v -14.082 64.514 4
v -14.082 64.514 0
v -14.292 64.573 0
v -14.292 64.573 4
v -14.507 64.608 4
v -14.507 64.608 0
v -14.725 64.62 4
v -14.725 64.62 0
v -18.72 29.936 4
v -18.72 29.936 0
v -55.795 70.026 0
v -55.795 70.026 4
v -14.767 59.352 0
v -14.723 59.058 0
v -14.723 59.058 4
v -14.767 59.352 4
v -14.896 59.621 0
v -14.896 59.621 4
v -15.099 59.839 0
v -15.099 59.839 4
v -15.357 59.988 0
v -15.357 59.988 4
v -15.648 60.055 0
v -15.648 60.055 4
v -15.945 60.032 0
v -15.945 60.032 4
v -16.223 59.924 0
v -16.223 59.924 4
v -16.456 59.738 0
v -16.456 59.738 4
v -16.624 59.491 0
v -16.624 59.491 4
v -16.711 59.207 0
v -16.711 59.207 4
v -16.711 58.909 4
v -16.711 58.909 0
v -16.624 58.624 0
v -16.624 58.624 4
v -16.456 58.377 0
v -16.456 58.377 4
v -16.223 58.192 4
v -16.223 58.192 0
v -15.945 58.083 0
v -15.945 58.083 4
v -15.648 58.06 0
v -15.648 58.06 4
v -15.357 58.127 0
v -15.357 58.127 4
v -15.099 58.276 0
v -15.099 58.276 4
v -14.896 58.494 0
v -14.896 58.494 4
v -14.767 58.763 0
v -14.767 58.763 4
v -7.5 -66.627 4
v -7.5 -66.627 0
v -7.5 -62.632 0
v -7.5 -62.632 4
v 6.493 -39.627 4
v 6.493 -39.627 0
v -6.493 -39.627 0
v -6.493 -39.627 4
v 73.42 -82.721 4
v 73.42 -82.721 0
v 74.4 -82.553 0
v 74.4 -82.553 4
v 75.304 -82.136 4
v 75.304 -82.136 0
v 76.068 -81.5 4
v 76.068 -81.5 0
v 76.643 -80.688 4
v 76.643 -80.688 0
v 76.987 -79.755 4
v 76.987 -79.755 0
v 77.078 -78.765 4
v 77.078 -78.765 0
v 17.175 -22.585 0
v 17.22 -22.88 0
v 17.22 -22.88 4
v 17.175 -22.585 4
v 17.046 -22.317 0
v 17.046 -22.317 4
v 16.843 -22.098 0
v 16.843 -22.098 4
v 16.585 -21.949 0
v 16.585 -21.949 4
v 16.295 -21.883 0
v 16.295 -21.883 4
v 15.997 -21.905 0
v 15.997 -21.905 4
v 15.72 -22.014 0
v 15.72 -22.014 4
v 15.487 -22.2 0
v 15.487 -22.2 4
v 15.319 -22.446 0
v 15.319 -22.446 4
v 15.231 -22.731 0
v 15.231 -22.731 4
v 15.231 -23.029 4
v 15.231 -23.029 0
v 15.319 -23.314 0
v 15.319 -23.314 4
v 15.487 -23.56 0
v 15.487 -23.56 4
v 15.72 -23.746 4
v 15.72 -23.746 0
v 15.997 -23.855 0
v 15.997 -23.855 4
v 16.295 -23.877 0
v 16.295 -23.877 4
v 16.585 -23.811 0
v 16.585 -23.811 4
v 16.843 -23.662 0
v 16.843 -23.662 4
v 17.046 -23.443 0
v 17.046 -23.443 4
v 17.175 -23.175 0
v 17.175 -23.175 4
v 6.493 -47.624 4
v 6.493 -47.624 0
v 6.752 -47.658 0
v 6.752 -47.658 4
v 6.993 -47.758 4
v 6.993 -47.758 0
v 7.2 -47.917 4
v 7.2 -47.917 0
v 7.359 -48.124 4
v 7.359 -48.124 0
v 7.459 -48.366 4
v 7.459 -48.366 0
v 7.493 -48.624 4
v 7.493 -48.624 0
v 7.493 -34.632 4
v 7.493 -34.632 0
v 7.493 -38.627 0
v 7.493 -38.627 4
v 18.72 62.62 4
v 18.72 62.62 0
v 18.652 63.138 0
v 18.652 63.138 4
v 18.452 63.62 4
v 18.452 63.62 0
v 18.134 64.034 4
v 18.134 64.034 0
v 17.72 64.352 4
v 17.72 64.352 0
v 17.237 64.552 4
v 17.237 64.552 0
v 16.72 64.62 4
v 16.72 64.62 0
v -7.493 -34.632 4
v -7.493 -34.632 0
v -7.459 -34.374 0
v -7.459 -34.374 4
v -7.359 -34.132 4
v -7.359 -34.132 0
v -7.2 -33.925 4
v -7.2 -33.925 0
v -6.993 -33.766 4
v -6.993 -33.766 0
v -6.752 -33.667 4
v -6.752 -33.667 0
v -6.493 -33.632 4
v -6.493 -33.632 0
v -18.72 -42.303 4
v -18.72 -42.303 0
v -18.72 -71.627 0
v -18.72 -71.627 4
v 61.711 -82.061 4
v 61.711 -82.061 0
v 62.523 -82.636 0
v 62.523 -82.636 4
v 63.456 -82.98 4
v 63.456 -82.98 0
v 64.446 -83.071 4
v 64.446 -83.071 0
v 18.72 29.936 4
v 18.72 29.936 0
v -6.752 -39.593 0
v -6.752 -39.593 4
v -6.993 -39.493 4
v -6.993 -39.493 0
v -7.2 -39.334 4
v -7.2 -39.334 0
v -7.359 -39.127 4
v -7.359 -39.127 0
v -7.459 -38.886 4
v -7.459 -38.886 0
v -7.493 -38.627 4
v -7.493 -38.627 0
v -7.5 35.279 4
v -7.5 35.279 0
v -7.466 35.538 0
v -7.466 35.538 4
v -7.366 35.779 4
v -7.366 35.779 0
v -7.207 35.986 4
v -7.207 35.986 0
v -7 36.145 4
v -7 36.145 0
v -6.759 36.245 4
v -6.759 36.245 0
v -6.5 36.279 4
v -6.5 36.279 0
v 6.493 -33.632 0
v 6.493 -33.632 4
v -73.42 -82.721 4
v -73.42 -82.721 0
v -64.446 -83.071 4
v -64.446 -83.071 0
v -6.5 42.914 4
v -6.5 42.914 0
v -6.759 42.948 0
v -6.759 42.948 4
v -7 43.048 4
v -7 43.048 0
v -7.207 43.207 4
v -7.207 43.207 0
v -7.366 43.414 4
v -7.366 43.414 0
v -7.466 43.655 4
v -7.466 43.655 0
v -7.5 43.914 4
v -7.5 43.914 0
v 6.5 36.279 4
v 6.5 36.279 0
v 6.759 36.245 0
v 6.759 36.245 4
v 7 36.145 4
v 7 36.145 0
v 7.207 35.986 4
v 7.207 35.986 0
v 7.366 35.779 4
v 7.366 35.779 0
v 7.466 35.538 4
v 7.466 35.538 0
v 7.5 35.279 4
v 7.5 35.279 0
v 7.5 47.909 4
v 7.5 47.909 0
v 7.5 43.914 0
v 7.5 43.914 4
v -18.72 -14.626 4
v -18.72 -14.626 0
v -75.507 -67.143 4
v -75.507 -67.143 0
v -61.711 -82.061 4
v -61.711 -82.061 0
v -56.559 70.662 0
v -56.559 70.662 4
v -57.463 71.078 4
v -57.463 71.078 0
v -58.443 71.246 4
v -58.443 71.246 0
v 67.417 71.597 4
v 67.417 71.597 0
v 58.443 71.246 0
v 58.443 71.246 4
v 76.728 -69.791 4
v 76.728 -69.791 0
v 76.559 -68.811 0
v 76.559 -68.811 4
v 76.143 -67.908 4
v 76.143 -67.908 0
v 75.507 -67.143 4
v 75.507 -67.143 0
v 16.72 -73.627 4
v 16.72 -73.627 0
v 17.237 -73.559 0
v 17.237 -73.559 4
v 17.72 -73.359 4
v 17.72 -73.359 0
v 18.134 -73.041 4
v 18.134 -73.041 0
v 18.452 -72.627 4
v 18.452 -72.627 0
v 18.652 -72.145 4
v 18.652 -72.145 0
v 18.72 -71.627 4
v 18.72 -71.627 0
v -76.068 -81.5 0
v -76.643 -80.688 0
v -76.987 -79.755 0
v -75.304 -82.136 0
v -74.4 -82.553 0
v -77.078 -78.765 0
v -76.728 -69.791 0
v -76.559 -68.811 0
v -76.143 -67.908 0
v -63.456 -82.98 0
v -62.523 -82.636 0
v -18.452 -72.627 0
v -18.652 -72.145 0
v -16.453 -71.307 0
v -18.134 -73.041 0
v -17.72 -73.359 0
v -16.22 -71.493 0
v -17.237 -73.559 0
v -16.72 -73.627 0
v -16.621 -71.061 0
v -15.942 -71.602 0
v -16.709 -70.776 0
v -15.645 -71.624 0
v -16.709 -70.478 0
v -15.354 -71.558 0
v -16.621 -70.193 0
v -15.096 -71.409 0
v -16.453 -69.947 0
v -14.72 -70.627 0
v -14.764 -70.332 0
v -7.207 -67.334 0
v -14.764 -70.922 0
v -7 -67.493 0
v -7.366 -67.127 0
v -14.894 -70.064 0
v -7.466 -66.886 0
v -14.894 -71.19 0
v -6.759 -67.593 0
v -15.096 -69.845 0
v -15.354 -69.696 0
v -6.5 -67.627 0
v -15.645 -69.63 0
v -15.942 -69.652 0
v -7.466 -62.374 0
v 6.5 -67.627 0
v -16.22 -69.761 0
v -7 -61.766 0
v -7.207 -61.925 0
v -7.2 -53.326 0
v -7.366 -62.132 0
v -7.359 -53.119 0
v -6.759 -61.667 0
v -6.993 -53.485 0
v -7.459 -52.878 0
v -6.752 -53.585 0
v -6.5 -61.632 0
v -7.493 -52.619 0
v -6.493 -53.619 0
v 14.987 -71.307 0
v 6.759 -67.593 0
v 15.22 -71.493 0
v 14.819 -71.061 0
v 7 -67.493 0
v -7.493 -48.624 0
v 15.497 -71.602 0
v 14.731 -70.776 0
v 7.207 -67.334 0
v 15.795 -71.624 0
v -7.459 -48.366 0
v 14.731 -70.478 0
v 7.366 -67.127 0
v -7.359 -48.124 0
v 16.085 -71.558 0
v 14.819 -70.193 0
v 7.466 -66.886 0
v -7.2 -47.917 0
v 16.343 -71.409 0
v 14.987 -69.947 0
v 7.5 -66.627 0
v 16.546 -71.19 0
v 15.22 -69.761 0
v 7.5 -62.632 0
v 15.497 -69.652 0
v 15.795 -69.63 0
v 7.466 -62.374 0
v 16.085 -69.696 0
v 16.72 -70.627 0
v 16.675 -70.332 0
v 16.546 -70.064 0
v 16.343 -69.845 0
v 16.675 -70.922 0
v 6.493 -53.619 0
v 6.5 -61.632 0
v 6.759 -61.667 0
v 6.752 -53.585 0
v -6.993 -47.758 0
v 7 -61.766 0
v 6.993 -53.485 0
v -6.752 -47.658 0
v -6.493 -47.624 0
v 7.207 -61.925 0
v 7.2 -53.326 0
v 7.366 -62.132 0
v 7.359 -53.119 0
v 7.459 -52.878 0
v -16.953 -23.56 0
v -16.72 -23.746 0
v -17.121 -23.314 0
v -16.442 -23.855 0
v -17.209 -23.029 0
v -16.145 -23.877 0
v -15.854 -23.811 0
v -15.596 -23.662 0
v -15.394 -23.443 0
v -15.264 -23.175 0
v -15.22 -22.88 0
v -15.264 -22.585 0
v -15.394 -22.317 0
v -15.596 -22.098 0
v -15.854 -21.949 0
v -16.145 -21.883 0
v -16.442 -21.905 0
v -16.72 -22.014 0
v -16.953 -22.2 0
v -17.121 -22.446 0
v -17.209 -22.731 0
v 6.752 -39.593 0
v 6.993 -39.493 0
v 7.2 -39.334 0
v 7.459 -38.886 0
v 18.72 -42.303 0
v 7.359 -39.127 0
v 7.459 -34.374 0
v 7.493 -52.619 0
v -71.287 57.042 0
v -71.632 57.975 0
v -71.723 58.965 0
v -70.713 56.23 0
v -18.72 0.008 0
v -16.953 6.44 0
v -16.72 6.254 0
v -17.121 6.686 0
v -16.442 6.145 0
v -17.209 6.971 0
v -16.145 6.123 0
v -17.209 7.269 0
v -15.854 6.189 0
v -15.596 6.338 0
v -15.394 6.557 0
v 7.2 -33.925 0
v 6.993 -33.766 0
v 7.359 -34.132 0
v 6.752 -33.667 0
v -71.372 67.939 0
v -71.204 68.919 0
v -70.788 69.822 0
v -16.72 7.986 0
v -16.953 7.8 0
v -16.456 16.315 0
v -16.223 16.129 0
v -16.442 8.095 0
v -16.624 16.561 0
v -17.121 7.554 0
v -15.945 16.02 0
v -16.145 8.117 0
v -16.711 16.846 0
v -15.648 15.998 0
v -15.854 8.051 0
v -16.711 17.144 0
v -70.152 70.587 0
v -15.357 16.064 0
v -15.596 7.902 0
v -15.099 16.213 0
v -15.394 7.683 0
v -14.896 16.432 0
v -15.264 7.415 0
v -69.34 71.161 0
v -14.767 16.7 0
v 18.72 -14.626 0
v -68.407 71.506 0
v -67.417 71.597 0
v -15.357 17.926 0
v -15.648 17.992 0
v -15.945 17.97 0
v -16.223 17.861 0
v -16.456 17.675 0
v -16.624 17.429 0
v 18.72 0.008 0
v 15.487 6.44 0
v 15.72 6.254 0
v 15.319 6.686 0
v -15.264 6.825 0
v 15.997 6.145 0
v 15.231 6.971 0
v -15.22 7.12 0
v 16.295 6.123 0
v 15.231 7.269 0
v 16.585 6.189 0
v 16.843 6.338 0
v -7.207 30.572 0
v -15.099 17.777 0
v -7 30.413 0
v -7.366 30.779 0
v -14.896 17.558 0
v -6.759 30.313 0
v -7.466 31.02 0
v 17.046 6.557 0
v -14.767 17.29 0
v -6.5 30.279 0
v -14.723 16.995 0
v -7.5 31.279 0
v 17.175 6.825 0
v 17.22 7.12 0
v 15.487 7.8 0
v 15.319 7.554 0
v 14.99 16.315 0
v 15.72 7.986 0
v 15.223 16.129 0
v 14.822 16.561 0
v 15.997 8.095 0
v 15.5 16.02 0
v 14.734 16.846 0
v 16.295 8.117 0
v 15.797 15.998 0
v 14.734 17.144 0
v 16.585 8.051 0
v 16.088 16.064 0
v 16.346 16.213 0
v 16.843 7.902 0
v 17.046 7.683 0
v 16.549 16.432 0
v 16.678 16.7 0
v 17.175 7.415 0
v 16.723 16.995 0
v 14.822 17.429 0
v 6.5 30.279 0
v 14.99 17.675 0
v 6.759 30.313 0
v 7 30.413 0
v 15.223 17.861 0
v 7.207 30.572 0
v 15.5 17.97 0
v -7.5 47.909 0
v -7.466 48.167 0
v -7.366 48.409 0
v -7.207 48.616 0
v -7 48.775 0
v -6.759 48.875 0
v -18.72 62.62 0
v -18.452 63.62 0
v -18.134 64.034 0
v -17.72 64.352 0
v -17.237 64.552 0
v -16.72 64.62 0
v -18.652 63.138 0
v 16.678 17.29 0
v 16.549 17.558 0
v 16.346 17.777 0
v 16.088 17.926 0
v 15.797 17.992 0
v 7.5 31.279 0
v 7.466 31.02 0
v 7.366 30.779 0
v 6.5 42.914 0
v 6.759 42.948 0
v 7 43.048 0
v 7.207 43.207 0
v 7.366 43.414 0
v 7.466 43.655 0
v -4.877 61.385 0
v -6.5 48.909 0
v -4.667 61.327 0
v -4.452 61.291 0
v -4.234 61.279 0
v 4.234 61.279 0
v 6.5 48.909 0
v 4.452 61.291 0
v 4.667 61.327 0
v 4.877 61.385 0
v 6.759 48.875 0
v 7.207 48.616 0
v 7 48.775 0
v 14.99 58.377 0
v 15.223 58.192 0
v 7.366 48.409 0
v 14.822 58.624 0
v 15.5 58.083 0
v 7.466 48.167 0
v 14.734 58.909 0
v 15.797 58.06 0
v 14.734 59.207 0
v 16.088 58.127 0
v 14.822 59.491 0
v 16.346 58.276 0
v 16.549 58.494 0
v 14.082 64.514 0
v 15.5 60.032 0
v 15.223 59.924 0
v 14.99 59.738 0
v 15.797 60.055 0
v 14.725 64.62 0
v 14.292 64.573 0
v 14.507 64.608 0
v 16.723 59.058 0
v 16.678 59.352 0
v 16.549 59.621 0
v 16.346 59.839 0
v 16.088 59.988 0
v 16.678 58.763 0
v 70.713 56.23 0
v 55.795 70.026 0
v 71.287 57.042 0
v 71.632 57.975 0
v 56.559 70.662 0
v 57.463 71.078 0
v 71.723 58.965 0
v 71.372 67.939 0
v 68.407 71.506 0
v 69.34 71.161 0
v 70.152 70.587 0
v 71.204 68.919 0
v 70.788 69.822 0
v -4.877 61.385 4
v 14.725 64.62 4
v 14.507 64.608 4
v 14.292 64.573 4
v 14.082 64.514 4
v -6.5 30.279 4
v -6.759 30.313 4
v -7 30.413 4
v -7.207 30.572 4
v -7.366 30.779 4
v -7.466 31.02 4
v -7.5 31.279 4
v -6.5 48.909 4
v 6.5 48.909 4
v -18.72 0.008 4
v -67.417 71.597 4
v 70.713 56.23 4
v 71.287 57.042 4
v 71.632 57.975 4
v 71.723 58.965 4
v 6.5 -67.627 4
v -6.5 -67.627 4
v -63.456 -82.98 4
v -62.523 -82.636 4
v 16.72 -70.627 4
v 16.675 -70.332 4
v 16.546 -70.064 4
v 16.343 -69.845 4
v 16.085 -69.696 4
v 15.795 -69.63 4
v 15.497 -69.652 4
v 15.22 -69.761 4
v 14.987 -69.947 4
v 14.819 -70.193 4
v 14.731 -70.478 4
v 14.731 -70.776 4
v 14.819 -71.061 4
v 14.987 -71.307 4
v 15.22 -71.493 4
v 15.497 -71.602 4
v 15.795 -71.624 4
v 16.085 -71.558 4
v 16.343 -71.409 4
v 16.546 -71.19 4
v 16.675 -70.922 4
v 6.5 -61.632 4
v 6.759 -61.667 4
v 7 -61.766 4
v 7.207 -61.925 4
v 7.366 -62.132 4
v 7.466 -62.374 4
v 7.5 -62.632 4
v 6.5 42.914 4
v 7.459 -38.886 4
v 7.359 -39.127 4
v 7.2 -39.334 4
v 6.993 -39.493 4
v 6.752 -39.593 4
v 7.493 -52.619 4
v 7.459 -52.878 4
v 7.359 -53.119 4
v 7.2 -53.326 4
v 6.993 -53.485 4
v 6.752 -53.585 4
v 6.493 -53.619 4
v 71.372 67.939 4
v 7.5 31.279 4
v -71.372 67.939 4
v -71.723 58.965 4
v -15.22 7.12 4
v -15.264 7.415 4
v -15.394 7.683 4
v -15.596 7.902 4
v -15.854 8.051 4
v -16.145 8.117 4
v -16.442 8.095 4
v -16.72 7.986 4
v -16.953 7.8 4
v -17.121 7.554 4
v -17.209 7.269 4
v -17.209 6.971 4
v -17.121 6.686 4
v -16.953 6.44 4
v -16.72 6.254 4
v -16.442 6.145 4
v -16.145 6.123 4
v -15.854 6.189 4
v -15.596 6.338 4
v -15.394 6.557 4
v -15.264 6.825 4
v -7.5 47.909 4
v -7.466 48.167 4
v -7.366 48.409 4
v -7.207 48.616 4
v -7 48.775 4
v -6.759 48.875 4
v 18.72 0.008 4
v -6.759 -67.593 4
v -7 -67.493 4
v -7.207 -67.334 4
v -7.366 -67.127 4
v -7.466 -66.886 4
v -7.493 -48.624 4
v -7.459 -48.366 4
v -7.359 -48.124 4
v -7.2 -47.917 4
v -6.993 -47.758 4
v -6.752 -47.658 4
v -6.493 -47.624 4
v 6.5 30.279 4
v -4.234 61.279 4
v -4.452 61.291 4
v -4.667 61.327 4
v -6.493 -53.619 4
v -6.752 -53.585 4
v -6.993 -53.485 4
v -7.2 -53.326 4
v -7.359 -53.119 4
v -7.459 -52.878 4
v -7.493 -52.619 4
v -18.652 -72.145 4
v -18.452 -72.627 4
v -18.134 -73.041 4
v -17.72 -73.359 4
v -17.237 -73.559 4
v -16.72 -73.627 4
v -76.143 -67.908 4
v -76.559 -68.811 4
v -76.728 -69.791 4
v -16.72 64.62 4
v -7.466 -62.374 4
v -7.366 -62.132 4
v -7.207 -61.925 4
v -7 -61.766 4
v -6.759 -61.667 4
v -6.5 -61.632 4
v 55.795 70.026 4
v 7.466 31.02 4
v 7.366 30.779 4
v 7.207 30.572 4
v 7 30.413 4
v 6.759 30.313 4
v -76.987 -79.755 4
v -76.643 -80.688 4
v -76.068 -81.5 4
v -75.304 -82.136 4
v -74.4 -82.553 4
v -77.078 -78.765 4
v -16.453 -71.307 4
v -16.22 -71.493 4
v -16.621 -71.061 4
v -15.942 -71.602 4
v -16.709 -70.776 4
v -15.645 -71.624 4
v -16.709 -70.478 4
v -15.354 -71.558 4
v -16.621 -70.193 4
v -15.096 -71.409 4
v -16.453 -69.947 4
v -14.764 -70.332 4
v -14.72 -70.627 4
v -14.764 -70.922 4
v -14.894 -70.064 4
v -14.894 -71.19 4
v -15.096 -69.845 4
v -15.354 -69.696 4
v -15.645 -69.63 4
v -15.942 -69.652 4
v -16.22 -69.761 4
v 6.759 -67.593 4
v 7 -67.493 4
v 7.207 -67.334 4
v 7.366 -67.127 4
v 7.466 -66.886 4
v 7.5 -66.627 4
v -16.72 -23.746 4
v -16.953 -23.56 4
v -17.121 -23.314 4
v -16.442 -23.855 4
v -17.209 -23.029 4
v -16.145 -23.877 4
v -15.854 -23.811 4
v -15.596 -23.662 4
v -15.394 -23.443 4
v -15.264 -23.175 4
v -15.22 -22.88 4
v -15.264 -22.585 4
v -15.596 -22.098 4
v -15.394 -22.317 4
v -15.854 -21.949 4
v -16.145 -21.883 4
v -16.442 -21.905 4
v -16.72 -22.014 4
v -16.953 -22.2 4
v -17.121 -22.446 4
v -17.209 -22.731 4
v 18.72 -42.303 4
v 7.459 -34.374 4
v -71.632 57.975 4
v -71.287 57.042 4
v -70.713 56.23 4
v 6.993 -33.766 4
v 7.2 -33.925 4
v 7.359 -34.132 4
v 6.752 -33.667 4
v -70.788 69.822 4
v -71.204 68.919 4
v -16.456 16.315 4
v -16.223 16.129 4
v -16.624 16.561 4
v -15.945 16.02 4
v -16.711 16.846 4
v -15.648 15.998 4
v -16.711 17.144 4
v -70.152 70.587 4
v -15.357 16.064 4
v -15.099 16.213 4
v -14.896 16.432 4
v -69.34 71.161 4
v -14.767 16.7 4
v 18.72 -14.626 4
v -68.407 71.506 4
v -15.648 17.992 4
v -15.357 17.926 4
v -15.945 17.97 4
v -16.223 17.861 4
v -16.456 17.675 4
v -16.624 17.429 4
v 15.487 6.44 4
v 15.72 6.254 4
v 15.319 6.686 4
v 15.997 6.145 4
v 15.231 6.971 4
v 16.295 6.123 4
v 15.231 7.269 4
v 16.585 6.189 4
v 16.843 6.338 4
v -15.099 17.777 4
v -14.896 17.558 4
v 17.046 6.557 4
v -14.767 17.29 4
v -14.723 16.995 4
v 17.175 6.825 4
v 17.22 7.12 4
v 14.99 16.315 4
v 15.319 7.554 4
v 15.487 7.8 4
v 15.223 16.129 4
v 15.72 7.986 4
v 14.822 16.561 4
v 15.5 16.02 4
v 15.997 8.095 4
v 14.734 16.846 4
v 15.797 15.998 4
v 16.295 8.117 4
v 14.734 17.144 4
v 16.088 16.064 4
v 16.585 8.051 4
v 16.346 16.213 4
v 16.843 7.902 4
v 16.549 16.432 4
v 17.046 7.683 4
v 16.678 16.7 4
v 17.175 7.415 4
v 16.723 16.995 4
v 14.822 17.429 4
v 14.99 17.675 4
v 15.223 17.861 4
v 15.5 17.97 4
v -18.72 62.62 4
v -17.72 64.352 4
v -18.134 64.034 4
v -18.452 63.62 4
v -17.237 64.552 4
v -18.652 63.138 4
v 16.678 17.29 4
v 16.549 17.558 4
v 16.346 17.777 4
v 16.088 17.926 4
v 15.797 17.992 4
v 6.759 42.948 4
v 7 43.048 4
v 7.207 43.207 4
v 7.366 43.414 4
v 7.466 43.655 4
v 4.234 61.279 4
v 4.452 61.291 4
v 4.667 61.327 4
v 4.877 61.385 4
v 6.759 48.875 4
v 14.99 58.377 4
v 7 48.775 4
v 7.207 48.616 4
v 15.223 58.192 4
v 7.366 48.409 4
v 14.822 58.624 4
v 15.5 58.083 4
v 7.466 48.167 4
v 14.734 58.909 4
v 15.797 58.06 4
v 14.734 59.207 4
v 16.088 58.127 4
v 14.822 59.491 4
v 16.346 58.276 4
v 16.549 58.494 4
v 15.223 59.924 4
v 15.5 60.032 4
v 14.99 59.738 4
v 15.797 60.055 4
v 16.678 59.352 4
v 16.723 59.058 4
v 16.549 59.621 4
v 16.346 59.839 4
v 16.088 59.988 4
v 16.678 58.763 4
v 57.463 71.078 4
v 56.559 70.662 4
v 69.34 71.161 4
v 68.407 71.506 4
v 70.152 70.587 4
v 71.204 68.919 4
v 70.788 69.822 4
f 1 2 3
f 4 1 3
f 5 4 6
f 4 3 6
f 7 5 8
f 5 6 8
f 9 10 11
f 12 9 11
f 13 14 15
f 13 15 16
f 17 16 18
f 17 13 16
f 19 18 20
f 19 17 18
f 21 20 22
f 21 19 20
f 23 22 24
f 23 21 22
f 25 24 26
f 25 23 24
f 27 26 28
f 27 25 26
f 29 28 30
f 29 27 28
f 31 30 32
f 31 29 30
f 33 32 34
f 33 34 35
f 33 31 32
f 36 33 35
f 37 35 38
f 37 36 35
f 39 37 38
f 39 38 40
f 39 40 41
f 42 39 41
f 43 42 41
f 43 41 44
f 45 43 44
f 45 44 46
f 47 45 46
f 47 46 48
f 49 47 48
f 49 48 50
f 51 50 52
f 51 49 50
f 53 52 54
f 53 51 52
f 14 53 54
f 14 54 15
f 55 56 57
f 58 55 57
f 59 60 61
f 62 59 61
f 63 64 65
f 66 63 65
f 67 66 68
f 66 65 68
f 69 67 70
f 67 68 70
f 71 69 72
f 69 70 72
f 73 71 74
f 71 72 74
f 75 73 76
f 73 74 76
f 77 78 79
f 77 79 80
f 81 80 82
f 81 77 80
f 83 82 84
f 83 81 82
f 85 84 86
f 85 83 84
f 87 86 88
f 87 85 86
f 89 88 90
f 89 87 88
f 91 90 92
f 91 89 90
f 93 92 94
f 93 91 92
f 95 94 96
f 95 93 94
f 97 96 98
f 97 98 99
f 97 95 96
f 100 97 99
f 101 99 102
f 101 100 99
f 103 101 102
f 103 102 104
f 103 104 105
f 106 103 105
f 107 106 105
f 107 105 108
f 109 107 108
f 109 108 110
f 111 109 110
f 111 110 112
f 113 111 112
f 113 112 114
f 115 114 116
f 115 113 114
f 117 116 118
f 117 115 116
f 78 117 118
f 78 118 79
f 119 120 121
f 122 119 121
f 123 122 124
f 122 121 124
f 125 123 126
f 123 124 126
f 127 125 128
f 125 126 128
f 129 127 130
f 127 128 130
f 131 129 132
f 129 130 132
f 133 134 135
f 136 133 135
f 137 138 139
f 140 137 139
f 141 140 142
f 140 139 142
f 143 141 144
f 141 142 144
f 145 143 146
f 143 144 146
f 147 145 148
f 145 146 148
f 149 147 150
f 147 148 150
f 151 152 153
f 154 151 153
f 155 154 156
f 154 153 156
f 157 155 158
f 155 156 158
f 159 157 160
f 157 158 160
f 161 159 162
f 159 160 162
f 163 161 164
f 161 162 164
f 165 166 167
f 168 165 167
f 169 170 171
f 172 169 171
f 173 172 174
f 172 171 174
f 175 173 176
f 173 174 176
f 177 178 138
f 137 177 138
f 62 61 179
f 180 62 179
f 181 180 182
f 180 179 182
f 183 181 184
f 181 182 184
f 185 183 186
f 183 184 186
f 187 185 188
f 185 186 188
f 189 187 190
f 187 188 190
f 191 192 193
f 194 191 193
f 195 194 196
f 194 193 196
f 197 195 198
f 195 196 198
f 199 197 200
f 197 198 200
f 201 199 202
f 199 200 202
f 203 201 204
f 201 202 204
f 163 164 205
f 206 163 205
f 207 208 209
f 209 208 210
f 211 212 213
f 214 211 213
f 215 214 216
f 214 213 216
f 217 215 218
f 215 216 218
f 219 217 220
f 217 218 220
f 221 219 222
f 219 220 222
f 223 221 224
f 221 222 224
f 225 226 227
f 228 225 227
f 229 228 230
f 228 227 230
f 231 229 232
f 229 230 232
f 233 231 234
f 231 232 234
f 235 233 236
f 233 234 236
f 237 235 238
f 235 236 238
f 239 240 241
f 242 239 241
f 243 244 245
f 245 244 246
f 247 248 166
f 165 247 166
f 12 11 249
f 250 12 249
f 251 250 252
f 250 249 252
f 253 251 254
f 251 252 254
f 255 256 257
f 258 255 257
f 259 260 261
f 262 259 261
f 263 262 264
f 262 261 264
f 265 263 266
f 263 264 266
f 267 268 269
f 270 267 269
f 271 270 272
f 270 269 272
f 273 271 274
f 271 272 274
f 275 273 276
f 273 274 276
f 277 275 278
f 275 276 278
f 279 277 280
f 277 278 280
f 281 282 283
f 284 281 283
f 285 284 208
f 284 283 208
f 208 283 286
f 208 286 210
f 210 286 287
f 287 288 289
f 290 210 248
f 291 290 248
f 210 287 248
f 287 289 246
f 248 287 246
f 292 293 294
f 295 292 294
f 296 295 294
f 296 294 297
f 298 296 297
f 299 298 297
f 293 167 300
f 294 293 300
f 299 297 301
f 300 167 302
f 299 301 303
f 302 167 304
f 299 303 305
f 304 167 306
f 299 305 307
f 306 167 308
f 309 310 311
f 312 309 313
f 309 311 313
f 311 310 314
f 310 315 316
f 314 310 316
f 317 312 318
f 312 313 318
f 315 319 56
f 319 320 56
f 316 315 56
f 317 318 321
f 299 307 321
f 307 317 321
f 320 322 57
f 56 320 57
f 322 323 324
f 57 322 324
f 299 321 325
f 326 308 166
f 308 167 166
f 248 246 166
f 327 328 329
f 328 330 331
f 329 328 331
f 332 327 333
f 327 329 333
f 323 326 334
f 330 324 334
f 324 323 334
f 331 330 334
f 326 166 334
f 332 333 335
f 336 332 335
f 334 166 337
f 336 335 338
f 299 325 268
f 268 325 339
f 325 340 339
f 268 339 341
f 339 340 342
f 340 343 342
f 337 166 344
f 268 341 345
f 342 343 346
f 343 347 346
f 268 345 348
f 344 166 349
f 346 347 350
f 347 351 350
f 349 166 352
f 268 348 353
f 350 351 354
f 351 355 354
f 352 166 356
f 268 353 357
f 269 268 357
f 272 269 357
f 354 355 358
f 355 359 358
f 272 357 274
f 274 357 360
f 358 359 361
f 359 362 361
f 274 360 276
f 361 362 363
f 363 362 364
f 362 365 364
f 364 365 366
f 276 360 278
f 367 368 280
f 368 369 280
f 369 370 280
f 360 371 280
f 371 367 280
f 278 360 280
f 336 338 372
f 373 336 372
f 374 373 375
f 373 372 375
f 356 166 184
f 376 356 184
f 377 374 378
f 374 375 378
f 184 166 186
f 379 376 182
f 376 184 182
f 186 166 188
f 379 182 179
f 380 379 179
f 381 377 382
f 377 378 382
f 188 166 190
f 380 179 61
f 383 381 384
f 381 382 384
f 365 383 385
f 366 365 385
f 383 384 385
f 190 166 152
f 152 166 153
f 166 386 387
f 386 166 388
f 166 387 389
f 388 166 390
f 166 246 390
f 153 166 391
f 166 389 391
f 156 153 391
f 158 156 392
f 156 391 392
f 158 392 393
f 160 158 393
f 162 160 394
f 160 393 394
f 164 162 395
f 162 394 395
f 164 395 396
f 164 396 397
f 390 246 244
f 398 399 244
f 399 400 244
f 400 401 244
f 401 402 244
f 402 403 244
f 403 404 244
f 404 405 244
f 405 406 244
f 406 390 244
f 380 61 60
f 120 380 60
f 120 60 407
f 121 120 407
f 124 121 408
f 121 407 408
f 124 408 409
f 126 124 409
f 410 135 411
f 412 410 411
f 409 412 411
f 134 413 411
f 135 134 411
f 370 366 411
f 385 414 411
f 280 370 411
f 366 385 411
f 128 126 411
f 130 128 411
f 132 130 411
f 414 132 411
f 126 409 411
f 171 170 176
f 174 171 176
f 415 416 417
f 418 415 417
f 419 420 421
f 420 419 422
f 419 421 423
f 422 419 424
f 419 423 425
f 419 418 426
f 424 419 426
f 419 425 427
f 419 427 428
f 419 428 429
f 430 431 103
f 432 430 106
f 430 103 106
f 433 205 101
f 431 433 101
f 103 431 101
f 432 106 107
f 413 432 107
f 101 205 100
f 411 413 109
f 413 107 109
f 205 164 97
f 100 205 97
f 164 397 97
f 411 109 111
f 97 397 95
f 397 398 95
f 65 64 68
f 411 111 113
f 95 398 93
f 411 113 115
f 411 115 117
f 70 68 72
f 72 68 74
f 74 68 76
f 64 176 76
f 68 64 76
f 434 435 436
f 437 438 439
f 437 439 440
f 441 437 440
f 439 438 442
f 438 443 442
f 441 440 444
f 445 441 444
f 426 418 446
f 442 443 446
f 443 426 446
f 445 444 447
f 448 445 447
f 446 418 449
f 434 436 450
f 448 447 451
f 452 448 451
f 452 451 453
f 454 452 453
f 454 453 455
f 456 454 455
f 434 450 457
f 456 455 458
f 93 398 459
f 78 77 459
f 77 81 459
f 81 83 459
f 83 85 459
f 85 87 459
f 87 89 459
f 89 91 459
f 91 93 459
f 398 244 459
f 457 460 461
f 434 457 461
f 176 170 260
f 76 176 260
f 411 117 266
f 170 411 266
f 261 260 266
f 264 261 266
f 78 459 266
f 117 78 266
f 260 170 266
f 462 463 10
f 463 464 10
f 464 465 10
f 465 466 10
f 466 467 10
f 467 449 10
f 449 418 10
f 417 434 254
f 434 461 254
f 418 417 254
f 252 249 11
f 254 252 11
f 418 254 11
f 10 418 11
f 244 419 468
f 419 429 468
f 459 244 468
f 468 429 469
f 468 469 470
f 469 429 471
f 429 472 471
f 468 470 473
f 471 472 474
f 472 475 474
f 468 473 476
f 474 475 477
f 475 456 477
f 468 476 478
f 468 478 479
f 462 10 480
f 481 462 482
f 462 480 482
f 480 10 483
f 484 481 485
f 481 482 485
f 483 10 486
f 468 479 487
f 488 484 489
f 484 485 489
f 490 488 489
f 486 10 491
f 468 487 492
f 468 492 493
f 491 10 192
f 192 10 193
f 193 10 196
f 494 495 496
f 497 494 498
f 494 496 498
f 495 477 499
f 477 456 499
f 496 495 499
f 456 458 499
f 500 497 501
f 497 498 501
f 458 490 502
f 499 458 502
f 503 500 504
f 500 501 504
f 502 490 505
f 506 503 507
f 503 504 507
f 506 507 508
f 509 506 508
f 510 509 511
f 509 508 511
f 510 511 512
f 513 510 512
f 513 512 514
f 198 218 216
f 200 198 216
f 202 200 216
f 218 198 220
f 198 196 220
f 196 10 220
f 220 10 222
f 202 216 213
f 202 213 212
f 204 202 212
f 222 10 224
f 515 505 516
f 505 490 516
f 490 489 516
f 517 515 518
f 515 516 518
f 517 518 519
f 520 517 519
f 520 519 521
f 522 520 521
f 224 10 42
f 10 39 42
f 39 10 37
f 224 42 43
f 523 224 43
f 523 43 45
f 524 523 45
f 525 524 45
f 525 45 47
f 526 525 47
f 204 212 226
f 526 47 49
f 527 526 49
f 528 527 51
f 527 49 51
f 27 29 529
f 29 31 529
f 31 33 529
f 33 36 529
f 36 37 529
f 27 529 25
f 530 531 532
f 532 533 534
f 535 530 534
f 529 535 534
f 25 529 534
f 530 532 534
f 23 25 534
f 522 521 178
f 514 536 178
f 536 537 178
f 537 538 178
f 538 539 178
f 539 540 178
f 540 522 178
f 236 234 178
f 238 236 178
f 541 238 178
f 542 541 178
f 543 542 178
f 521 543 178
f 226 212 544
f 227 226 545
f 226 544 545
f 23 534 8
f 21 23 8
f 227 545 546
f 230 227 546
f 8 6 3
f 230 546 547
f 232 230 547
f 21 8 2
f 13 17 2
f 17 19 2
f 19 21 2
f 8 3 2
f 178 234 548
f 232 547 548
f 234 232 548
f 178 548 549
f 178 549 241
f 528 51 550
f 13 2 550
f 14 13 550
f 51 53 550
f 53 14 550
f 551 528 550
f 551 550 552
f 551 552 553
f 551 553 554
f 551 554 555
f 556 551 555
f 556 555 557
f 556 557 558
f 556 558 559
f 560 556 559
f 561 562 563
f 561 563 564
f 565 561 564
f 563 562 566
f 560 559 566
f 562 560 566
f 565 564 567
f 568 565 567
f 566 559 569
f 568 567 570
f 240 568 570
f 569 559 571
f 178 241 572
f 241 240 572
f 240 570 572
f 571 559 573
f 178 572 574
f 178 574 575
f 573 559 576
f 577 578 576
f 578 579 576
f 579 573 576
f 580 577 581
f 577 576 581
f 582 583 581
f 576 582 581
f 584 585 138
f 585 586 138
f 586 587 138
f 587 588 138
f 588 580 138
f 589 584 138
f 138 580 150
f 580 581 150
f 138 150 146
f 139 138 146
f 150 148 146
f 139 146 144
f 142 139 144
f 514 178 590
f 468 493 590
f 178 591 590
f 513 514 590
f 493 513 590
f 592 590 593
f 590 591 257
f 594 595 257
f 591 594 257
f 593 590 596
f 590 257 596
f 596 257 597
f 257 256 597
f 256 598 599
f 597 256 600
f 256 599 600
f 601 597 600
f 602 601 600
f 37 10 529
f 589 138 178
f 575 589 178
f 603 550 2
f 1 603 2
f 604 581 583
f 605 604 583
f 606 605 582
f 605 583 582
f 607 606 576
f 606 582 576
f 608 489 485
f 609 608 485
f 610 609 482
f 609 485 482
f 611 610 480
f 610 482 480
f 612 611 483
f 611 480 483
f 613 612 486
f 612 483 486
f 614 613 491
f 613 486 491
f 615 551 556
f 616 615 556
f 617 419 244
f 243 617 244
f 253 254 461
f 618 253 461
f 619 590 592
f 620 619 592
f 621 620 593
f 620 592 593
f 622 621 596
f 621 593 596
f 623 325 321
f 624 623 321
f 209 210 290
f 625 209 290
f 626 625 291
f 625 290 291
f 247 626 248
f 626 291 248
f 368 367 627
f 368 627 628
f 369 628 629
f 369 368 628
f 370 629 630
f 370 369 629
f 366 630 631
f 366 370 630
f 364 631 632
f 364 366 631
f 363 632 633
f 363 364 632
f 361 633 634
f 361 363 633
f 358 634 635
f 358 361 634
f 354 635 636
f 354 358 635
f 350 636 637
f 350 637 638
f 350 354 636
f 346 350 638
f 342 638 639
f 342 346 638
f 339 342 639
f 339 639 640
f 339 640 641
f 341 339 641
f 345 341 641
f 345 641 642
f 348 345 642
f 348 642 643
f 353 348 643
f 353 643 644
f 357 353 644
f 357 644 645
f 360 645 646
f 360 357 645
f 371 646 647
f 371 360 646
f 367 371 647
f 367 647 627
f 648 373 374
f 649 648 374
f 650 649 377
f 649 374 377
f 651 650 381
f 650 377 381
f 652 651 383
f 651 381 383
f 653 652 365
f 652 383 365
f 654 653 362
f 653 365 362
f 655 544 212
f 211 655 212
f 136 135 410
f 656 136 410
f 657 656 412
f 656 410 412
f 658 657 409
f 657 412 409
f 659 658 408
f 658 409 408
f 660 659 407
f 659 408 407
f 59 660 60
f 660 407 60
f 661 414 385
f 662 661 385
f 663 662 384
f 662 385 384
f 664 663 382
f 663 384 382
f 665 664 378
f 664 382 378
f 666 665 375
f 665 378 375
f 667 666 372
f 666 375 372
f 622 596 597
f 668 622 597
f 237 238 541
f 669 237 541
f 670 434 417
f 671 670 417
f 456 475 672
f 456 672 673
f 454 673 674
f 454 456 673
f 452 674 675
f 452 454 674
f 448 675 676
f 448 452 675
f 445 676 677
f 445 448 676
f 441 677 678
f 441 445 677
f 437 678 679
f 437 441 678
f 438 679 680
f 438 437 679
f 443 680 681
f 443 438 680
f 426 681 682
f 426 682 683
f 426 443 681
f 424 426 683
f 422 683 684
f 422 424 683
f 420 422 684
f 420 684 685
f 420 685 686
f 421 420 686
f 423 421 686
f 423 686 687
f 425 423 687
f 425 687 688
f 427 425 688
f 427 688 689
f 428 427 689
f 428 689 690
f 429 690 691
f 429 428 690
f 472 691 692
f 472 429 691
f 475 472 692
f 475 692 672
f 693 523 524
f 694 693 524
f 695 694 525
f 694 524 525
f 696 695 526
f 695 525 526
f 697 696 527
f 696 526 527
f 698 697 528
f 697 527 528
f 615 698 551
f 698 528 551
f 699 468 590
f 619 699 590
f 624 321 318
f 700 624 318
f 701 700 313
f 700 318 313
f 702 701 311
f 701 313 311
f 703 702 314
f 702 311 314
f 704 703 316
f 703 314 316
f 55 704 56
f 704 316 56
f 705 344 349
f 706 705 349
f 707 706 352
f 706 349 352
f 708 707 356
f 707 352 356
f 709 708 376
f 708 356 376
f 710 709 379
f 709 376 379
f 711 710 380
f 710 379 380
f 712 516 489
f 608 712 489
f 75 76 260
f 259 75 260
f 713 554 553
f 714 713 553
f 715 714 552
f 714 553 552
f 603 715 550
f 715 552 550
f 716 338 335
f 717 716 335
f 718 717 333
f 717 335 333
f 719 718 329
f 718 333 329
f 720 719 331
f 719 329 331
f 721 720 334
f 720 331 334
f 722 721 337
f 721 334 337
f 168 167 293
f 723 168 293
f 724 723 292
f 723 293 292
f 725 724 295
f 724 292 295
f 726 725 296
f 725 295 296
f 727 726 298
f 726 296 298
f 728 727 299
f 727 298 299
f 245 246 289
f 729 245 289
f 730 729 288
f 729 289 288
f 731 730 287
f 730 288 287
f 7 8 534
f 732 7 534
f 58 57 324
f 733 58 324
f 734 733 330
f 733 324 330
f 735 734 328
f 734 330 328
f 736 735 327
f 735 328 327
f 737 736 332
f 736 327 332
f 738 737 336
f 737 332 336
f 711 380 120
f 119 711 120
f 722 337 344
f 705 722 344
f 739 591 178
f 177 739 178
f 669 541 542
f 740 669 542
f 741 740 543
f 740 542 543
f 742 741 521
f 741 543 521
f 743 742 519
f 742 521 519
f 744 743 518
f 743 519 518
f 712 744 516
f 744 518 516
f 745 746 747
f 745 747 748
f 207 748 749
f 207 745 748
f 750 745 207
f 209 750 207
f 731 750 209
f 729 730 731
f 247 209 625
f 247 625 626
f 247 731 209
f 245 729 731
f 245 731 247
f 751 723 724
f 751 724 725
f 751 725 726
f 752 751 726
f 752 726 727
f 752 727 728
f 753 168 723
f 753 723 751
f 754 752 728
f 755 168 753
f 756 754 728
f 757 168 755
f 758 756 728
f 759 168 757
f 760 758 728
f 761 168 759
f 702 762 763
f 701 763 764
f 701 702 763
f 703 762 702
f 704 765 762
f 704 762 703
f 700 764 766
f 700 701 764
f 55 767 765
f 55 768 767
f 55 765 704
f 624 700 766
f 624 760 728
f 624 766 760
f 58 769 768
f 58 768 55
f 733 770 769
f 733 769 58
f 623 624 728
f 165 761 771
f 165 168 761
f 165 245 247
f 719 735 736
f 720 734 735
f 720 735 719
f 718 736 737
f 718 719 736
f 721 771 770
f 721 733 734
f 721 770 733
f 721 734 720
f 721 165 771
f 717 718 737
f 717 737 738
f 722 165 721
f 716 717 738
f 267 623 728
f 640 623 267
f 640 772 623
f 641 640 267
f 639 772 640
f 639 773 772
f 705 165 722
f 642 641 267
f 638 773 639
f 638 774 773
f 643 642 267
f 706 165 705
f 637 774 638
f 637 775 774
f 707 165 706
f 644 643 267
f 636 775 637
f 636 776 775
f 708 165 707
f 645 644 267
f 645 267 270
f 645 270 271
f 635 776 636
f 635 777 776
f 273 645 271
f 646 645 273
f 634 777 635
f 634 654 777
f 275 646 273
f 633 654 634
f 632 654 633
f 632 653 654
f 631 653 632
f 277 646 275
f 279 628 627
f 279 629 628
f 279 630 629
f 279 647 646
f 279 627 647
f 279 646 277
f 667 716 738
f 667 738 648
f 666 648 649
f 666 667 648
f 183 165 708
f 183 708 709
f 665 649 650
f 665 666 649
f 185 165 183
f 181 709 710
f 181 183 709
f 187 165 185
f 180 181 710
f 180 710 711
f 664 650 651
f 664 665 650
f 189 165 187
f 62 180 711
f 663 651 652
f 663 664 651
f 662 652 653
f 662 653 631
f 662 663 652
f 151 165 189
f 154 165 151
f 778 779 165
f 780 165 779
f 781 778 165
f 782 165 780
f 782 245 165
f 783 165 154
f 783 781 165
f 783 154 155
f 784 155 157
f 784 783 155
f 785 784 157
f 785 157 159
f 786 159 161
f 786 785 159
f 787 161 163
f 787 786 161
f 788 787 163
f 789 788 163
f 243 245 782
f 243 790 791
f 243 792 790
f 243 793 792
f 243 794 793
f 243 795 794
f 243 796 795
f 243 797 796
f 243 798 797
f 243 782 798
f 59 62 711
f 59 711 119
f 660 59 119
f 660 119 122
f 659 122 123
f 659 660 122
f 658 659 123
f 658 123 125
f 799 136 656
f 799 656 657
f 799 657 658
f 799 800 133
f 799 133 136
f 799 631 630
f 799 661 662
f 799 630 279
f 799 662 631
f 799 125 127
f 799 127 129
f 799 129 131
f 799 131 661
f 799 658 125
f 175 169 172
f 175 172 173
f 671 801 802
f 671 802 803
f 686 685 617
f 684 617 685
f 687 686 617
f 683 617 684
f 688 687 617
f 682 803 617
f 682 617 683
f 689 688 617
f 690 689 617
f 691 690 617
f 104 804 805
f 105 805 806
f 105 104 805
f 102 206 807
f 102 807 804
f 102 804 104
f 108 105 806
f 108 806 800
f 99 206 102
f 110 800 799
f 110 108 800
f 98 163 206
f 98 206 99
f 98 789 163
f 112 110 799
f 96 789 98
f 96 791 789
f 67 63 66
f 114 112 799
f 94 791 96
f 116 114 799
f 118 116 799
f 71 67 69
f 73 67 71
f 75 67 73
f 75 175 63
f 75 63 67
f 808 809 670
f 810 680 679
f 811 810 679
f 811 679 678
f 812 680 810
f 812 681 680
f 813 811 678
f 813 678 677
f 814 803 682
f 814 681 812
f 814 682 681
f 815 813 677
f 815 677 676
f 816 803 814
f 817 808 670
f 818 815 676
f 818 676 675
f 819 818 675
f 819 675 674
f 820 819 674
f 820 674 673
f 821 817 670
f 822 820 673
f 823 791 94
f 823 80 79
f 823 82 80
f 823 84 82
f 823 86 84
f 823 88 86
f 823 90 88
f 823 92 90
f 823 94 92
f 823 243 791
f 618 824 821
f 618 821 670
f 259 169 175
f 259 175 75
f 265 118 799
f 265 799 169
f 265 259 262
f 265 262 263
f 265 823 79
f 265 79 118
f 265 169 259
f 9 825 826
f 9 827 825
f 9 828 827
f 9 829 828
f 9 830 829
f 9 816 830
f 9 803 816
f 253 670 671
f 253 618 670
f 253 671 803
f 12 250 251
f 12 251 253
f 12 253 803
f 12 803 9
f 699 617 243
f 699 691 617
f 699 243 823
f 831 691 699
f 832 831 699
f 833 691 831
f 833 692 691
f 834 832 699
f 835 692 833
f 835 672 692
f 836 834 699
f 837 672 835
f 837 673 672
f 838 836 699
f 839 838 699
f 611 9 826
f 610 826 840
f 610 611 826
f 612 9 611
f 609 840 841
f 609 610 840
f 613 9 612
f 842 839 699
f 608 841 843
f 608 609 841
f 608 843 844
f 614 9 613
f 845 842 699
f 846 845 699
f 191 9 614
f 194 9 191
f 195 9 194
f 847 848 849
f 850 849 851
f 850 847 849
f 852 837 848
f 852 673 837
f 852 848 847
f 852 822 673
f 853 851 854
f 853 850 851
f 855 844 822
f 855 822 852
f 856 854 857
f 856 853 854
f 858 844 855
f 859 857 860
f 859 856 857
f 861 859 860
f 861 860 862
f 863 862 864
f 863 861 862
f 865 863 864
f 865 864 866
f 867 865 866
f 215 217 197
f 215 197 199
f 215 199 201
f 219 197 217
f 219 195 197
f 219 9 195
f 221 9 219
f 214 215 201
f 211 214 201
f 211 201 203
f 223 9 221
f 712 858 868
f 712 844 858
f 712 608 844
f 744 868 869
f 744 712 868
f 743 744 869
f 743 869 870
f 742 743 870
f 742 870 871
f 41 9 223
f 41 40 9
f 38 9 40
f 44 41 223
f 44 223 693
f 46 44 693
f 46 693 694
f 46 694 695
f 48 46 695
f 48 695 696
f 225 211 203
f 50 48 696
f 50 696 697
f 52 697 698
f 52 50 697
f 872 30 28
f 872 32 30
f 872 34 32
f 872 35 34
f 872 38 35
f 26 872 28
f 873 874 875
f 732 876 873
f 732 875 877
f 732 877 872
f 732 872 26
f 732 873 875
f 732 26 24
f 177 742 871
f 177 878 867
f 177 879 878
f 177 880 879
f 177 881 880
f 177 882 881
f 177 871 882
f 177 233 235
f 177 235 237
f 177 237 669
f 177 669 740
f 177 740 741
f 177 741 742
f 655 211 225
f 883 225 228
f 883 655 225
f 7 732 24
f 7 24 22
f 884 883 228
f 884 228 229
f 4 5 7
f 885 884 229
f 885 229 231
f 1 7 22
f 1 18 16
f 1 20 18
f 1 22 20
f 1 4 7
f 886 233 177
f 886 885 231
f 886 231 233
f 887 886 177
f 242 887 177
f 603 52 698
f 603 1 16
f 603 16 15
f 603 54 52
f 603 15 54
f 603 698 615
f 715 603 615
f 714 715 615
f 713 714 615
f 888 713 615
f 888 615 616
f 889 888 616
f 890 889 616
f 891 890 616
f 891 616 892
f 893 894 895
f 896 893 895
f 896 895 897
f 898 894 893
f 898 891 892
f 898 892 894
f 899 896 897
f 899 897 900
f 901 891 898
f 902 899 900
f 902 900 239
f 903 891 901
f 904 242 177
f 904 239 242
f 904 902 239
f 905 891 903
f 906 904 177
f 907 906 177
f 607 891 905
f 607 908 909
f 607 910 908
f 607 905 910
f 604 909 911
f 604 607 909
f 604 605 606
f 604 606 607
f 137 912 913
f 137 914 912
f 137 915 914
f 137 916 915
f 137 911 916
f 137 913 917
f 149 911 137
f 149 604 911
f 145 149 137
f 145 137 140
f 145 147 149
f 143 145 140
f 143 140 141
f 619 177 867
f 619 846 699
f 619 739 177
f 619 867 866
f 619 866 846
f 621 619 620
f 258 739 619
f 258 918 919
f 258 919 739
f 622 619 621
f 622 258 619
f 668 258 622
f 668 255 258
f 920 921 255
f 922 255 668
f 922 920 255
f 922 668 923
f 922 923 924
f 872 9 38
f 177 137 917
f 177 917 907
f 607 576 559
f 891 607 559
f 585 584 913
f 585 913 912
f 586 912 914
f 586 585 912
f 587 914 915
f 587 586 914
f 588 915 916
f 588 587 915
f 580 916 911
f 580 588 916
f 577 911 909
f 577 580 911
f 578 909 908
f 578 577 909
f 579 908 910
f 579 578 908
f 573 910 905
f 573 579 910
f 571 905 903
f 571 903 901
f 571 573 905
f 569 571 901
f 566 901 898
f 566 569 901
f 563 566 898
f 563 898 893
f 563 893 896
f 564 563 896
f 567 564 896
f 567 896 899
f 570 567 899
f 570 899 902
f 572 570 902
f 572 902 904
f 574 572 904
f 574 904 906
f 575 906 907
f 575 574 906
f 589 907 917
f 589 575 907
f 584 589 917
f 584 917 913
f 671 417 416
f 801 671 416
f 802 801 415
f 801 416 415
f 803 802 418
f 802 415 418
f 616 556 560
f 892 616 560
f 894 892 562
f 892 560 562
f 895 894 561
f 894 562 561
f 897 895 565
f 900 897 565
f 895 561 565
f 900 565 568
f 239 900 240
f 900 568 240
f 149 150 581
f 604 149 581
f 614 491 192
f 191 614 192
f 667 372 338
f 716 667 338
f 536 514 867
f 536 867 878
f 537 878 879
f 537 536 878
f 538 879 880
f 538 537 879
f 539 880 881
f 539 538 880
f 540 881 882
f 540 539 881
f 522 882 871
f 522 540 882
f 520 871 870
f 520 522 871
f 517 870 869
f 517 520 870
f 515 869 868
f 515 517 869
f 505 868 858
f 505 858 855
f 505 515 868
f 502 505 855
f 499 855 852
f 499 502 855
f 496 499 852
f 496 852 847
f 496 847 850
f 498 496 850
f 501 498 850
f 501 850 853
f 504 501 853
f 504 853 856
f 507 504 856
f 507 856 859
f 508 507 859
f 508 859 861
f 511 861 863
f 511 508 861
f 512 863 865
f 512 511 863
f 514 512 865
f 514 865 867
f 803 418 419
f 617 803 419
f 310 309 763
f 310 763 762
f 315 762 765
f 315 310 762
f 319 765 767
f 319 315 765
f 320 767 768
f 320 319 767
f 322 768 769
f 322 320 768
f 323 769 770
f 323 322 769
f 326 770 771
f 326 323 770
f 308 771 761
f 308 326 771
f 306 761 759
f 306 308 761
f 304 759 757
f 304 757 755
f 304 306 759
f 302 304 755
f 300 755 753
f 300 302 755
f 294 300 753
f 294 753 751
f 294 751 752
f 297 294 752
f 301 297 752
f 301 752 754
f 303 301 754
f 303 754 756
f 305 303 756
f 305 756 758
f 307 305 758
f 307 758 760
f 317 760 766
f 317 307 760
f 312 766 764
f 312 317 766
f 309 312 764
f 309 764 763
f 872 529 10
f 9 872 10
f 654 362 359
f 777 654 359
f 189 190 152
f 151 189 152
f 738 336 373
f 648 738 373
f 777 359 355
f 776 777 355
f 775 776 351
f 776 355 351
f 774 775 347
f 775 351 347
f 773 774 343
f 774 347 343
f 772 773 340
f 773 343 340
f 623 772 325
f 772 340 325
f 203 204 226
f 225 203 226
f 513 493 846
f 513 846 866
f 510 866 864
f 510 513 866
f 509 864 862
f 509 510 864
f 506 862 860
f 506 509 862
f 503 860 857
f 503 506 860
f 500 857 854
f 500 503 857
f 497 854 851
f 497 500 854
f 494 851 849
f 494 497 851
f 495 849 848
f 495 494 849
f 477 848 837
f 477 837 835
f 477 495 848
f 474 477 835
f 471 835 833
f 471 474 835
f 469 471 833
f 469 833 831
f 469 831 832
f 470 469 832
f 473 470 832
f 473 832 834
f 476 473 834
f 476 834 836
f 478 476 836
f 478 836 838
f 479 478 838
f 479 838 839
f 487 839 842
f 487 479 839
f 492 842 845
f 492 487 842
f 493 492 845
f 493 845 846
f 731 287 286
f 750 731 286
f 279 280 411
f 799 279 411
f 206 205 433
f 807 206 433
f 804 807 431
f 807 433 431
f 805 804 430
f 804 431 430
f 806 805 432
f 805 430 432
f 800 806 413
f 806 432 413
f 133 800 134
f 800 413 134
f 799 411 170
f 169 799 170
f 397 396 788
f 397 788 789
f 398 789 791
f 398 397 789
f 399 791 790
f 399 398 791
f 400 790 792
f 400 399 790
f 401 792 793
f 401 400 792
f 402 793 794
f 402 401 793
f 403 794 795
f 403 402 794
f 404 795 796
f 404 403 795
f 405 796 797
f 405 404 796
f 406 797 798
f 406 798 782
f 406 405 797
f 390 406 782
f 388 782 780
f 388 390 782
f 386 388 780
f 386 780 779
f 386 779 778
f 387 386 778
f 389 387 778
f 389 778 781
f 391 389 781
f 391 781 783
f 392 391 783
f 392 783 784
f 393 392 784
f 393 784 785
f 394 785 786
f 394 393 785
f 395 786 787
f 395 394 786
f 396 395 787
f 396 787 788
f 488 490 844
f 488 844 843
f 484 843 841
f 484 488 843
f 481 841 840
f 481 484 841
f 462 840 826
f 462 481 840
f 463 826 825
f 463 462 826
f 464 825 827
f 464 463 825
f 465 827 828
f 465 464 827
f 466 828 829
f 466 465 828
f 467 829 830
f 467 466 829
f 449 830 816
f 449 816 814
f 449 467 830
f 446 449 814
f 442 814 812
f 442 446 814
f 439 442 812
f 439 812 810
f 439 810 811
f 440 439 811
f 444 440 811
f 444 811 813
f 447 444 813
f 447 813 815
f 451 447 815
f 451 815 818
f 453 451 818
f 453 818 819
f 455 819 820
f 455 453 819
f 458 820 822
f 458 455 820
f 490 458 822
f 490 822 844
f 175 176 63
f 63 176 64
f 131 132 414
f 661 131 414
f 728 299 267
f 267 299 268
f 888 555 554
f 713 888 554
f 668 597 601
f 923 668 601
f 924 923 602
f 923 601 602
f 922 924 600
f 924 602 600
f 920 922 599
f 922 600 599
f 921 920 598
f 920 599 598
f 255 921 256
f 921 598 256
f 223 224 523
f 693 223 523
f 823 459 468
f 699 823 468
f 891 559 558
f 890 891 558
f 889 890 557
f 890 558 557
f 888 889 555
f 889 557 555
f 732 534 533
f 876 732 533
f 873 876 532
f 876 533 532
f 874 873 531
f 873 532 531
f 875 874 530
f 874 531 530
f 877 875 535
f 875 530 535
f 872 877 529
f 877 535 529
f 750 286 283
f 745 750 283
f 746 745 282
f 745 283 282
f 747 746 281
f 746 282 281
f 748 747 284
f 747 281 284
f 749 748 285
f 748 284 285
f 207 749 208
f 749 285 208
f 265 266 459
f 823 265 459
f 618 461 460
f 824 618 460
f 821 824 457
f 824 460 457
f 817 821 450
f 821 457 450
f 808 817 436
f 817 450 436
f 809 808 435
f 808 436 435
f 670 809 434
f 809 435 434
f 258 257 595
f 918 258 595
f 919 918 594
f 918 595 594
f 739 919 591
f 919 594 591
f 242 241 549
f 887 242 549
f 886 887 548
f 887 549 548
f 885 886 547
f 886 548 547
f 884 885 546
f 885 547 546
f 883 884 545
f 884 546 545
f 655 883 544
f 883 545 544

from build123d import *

# Parameters (mm, degrees)
F0_R     = 1
F1_DEPTH = 4


with BuildPart() as f1:
    # F0 (on Top) → F1 (new body)
    with BuildSketch(Plane.XY):
        with BuildLine():
            ThreePointArc((-16.7198, 64.620168), (-18.134014, 64.034382), (-18.7198, 62.620168))
            Line((-18.7198, 62.620168), (-18.7198, 29.936337))
            Line((-18.7198, 29.936337), (-55.794644, 70.026107))
            ThreePointArc((-55.794644, 70.026107), (-56.99751, 70.899639), (-58.443099, 71.246361))
            Line((-58.443099, 71.246361), (-67.416509, 71.596964))
            ThreePointArc((-67.416509, 71.596964), (-70.152099, 70.587073), (-71.372352, 67.938617))
            Line((-71.372352, 67.938617), (-71.722956, 58.965208))
            ThreePointArc((-71.722956, 58.965208), (-71.490081, 57.496973), (-70.713064, 56.229618))
            Line((-70.713064, 56.229618), (-18.7198, 0.008261))
            Line((-18.7198, 0.008261), (-18.7198, -14.626099))
            Line((-18.7198, -14.626099), (-75.507393, -67.143016))
            ThreePointArc((-75.507393, -67.143016), (-76.380925, -68.345882), (-76.727646, -69.791472))
            Line((-76.727646, -69.791472), (-77.078249, -78.764881))
            ThreePointArc((-77.078249, -78.764881), (-76.068358, -81.500471), (-73.419902, -82.720725))
            Line((-73.419902, -82.720725), (-64.446493, -83.071328))
            ThreePointArc((-64.446493, -83.071328), (-62.978258, -82.838454), (-61.710903, -82.061437))
            Line((-61.710903, -82.061437), (-18.7198, -42.303453))
            Line((-18.7198, -42.303453), (-18.7198, -71.62687))
            ThreePointArc((-18.7198, -71.62687), (-18.134014, -73.041084), (-16.7198, -73.62687))
            Line((-16.7198, -73.62687), (0, -73.62687))
            Line((0, -73.62687), (16.7198, -73.62687))
            ThreePointArc((16.7198, -73.62687), (18.134014, -73.041084), (18.7198, -71.62687))
            Line((18.7198, -71.62687), (18.7198, -42.303453))
            Line((18.7198, -42.303453), (61.710903, -82.061437))
            ThreePointArc((61.710903, -82.061437), (62.978258, -82.838454), (64.446493, -83.071328))
            Line((64.446493, -83.071328), (73.419902, -82.720725))
            ThreePointArc((73.419902, -82.720725), (76.068358, -81.500471), (77.078249, -78.764881))
            Line((77.078249, -78.764881), (76.727646, -69.791472))
            ThreePointArc((76.727646, -69.791472), (76.380925, -68.345882), (75.507393, -67.143016))
            Line((75.507393, -67.143016), (18.7198, -14.626099))
            Line((18.7198, -14.626099), (18.7198, 0.008261))
            Line((18.7198, 0.008261), (70.713064, 56.229618))
            ThreePointArc((70.713064, 56.229618), (71.490081, 57.496973), (71.722956, 58.965208))
            Line((71.722956, 58.965208), (71.372352, 67.938617))
            ThreePointArc((71.372352, 67.938617), (70.152099, 70.587073), (67.416509, 71.596964))
            Line((67.416509, 71.596964), (58.443099, 71.246361))
            ThreePointArc((58.443099, 71.246361), (56.99751, 70.899639), (55.794644, 70.026107))
            Line((55.794644, 70.026107), (18.7198, 29.936337))
            Line((18.7198, 29.936337), (18.7198, 62.620168))
            ThreePointArc((18.7198, 62.620168), (18.134014, 64.034382), (16.7198, 64.620168))
            Line((16.7198, 64.620168), (14.7254, 64.620168))
            ThreePointArc((14.7254, 64.620168), (14.399241, 64.593394), (14.081814, 64.513788))
            Line((14.081814, 64.513788), (4.877257, 61.385427))
            ThreePointArc((4.877257, 61.385427), (4.55983, 61.305821), (4.23367, 61.279047))
            Line((4.23367, 61.279047), (0, 61.279047))
            Line((0, 61.279047), (-4.23367, 61.279047))
            ThreePointArc((-4.23367, 61.279047), (-4.55983, 61.305821), (-4.877257, 61.385427))
            Line((-4.877257, 61.385427), (-14.081814, 64.513788))
            ThreePointArc((-14.081814, 64.513788), (-14.399241, 64.593394), (-14.7254, 64.620168))
            Line((-14.7254, 64.620168), (-16.7198, 64.620168))
        make_face()
        with Locations((-15.7198, -70.62687)):
            Circle(F0_R, mode=Mode.SUBTRACT)
        with Locations((-16.2198, -22.879832)):
            Circle(F0_R, mode=Mode.SUBTRACT)
        with BuildLine():
            Line((6.5, -67.62687), (0, -67.62687))
            Line((0, -67.62687), (-6.5, -67.62687))
            ThreePointArc((-6.5, -67.62687), (-7.207107, -67.333977), (-7.5, -66.62687))
            Line((-7.5, -66.62687), (-7.5, -62.63247))
            ThreePointArc((-7.5, -62.63247), (-7.207107, -61.925364), (-6.5, -61.63247))
            Line((-6.5, -61.63247), (0, -61.63247))
            Line((0, -61.63247), (6.5, -61.63247))
            ThreePointArc((6.5, -61.63247), (7.207107, -61.925364), (7.5, -62.63247))
            Line((7.5, -62.63247), (7.5, -66.62687))
            ThreePointArc((7.5, -66.62687), (7.207107, -67.333977), (6.5, -67.62687))
        make_face(mode=Mode.SUBTRACT)
        with Locations((15.7198, -70.62687)):
            Circle(F0_R, mode=Mode.SUBTRACT)
        with BuildLine():
            Line((6.493, -53.61877), (0, -53.61877))
            Line((0, -53.61877), (-6.493, -53.61877))
            ThreePointArc((-6.493, -53.61877), (-7.200107, -53.325877), (-7.493, -52.61877))
            Line((-7.493, -52.61877), (-7.493, -48.62437))
            ThreePointArc((-7.493, -48.62437), (-7.200107, -47.917264), (-6.493, -47.62437))
            Line((-6.493, -47.62437), (0, -47.62437))
            Line((0, -47.62437), (6.493, -47.62437))
            ThreePointArc((6.493, -47.62437), (7.200107, -47.917264), (7.493, -48.62437))
            Line((7.493, -48.62437), (7.493, -52.61877))
            ThreePointArc((7.493, -52.61877), (7.200107, -53.325877), (6.493, -53.61877))
        make_face(mode=Mode.SUBTRACT)
        with BuildLine():
            Line((6.493, -39.62687), (0, -39.62687))
            Line((0, -39.62687), (-6.493, -39.62687))
            ThreePointArc((-6.493, -39.62687), (-7.200107, -39.333977), (-7.493, -38.62687))
            Line((-7.493, -38.62687), (-7.493, -34.63247))
            ThreePointArc((-7.493, -34.63247), (-7.200107, -33.925364), (-6.493, -33.63247))
            Line((-6.493, -33.63247), (0, -33.63247))
            Line((0, -33.63247), (6.493, -33.63247))
            ThreePointArc((6.493, -33.63247), (7.200107, -33.925364), (7.493, -34.63247))
            Line((7.493, -34.63247), (7.493, -38.62687))
            ThreePointArc((7.493, -38.62687), (7.200107, -39.333977), (6.493, -39.62687))
        make_face(mode=Mode.SUBTRACT)
        with Locations((16.2198, -22.879832)):
            Circle(F0_R, mode=Mode.SUBTRACT)
        with Locations((-16.2198, 7.120168)):
            Circle(F0_R, mode=Mode.SUBTRACT)
        with Locations((-15.7226, 16.995168)):
            Circle(F0_R, mode=Mode.SUBTRACT)
        with Locations((-15.7226, 59.057568)):
            Circle(F0_R, mode=Mode.SUBTRACT)
        with Locations((16.2198, 7.120168)):
            Circle(F0_R, mode=Mode.SUBTRACT)
        with Locations((15.7226, 16.995168)):
            Circle(F0_R, mode=Mode.SUBTRACT)
        with BuildLine():
            Line((-6.5, 36.279047), (0, 36.279047))
            Line((0, 36.279047), (6.5, 36.279047))
            ThreePointArc((6.5, 36.279047), (7.207107, 35.986154), (7.5, 35.279047))
            Line((7.5, 35.279047), (7.5, 31.279047))
            ThreePointArc((7.5, 31.279047), (7.207107, 30.57194), (6.5, 30.279047))
            Line((6.5, 30.279047), (0, 30.279047))
            Line((0, 30.279047), (-6.5, 30.279047))
            ThreePointArc((-6.5, 30.279047), (-7.207107, 30.57194), (-7.5, 31.279047))
            Line((-7.5, 31.279047), (-7.5, 35.279047))
            ThreePointArc((-7.5, 35.279047), (-7.207107, 35.986154), (-6.5, 36.279047))
        make_face(mode=Mode.SUBTRACT)
        with BuildLine():
            Line((6.5, 42.914193), (-6.5, 42.914193))
            ThreePointArc((-6.5, 42.914193), (-7.207107, 43.207086), (-7.5, 43.914193))
            Line((-7.5, 43.914193), (-7.5, 47.908593))
            ThreePointArc((-7.5, 47.908593), (-7.207107, 48.6157), (-6.5, 48.908593))
            Line((-6.5, 48.908593), (6.5, 48.908593))
            ThreePointArc((6.5, 48.908593), (7.207107, 48.6157), (7.5, 47.908593))
            Line((7.5, 47.908593), (7.5, 43.914193))
            ThreePointArc((7.5, 43.914193), (7.207107, 43.207086), (6.5, 42.914193))
        make_face(mode=Mode.SUBTRACT)
        with Locations((15.7226, 59.057568)):
            Circle(F0_R, mode=Mode.SUBTRACT)
    extrude(amount=F1_DEPTH)


solid = f1.part
